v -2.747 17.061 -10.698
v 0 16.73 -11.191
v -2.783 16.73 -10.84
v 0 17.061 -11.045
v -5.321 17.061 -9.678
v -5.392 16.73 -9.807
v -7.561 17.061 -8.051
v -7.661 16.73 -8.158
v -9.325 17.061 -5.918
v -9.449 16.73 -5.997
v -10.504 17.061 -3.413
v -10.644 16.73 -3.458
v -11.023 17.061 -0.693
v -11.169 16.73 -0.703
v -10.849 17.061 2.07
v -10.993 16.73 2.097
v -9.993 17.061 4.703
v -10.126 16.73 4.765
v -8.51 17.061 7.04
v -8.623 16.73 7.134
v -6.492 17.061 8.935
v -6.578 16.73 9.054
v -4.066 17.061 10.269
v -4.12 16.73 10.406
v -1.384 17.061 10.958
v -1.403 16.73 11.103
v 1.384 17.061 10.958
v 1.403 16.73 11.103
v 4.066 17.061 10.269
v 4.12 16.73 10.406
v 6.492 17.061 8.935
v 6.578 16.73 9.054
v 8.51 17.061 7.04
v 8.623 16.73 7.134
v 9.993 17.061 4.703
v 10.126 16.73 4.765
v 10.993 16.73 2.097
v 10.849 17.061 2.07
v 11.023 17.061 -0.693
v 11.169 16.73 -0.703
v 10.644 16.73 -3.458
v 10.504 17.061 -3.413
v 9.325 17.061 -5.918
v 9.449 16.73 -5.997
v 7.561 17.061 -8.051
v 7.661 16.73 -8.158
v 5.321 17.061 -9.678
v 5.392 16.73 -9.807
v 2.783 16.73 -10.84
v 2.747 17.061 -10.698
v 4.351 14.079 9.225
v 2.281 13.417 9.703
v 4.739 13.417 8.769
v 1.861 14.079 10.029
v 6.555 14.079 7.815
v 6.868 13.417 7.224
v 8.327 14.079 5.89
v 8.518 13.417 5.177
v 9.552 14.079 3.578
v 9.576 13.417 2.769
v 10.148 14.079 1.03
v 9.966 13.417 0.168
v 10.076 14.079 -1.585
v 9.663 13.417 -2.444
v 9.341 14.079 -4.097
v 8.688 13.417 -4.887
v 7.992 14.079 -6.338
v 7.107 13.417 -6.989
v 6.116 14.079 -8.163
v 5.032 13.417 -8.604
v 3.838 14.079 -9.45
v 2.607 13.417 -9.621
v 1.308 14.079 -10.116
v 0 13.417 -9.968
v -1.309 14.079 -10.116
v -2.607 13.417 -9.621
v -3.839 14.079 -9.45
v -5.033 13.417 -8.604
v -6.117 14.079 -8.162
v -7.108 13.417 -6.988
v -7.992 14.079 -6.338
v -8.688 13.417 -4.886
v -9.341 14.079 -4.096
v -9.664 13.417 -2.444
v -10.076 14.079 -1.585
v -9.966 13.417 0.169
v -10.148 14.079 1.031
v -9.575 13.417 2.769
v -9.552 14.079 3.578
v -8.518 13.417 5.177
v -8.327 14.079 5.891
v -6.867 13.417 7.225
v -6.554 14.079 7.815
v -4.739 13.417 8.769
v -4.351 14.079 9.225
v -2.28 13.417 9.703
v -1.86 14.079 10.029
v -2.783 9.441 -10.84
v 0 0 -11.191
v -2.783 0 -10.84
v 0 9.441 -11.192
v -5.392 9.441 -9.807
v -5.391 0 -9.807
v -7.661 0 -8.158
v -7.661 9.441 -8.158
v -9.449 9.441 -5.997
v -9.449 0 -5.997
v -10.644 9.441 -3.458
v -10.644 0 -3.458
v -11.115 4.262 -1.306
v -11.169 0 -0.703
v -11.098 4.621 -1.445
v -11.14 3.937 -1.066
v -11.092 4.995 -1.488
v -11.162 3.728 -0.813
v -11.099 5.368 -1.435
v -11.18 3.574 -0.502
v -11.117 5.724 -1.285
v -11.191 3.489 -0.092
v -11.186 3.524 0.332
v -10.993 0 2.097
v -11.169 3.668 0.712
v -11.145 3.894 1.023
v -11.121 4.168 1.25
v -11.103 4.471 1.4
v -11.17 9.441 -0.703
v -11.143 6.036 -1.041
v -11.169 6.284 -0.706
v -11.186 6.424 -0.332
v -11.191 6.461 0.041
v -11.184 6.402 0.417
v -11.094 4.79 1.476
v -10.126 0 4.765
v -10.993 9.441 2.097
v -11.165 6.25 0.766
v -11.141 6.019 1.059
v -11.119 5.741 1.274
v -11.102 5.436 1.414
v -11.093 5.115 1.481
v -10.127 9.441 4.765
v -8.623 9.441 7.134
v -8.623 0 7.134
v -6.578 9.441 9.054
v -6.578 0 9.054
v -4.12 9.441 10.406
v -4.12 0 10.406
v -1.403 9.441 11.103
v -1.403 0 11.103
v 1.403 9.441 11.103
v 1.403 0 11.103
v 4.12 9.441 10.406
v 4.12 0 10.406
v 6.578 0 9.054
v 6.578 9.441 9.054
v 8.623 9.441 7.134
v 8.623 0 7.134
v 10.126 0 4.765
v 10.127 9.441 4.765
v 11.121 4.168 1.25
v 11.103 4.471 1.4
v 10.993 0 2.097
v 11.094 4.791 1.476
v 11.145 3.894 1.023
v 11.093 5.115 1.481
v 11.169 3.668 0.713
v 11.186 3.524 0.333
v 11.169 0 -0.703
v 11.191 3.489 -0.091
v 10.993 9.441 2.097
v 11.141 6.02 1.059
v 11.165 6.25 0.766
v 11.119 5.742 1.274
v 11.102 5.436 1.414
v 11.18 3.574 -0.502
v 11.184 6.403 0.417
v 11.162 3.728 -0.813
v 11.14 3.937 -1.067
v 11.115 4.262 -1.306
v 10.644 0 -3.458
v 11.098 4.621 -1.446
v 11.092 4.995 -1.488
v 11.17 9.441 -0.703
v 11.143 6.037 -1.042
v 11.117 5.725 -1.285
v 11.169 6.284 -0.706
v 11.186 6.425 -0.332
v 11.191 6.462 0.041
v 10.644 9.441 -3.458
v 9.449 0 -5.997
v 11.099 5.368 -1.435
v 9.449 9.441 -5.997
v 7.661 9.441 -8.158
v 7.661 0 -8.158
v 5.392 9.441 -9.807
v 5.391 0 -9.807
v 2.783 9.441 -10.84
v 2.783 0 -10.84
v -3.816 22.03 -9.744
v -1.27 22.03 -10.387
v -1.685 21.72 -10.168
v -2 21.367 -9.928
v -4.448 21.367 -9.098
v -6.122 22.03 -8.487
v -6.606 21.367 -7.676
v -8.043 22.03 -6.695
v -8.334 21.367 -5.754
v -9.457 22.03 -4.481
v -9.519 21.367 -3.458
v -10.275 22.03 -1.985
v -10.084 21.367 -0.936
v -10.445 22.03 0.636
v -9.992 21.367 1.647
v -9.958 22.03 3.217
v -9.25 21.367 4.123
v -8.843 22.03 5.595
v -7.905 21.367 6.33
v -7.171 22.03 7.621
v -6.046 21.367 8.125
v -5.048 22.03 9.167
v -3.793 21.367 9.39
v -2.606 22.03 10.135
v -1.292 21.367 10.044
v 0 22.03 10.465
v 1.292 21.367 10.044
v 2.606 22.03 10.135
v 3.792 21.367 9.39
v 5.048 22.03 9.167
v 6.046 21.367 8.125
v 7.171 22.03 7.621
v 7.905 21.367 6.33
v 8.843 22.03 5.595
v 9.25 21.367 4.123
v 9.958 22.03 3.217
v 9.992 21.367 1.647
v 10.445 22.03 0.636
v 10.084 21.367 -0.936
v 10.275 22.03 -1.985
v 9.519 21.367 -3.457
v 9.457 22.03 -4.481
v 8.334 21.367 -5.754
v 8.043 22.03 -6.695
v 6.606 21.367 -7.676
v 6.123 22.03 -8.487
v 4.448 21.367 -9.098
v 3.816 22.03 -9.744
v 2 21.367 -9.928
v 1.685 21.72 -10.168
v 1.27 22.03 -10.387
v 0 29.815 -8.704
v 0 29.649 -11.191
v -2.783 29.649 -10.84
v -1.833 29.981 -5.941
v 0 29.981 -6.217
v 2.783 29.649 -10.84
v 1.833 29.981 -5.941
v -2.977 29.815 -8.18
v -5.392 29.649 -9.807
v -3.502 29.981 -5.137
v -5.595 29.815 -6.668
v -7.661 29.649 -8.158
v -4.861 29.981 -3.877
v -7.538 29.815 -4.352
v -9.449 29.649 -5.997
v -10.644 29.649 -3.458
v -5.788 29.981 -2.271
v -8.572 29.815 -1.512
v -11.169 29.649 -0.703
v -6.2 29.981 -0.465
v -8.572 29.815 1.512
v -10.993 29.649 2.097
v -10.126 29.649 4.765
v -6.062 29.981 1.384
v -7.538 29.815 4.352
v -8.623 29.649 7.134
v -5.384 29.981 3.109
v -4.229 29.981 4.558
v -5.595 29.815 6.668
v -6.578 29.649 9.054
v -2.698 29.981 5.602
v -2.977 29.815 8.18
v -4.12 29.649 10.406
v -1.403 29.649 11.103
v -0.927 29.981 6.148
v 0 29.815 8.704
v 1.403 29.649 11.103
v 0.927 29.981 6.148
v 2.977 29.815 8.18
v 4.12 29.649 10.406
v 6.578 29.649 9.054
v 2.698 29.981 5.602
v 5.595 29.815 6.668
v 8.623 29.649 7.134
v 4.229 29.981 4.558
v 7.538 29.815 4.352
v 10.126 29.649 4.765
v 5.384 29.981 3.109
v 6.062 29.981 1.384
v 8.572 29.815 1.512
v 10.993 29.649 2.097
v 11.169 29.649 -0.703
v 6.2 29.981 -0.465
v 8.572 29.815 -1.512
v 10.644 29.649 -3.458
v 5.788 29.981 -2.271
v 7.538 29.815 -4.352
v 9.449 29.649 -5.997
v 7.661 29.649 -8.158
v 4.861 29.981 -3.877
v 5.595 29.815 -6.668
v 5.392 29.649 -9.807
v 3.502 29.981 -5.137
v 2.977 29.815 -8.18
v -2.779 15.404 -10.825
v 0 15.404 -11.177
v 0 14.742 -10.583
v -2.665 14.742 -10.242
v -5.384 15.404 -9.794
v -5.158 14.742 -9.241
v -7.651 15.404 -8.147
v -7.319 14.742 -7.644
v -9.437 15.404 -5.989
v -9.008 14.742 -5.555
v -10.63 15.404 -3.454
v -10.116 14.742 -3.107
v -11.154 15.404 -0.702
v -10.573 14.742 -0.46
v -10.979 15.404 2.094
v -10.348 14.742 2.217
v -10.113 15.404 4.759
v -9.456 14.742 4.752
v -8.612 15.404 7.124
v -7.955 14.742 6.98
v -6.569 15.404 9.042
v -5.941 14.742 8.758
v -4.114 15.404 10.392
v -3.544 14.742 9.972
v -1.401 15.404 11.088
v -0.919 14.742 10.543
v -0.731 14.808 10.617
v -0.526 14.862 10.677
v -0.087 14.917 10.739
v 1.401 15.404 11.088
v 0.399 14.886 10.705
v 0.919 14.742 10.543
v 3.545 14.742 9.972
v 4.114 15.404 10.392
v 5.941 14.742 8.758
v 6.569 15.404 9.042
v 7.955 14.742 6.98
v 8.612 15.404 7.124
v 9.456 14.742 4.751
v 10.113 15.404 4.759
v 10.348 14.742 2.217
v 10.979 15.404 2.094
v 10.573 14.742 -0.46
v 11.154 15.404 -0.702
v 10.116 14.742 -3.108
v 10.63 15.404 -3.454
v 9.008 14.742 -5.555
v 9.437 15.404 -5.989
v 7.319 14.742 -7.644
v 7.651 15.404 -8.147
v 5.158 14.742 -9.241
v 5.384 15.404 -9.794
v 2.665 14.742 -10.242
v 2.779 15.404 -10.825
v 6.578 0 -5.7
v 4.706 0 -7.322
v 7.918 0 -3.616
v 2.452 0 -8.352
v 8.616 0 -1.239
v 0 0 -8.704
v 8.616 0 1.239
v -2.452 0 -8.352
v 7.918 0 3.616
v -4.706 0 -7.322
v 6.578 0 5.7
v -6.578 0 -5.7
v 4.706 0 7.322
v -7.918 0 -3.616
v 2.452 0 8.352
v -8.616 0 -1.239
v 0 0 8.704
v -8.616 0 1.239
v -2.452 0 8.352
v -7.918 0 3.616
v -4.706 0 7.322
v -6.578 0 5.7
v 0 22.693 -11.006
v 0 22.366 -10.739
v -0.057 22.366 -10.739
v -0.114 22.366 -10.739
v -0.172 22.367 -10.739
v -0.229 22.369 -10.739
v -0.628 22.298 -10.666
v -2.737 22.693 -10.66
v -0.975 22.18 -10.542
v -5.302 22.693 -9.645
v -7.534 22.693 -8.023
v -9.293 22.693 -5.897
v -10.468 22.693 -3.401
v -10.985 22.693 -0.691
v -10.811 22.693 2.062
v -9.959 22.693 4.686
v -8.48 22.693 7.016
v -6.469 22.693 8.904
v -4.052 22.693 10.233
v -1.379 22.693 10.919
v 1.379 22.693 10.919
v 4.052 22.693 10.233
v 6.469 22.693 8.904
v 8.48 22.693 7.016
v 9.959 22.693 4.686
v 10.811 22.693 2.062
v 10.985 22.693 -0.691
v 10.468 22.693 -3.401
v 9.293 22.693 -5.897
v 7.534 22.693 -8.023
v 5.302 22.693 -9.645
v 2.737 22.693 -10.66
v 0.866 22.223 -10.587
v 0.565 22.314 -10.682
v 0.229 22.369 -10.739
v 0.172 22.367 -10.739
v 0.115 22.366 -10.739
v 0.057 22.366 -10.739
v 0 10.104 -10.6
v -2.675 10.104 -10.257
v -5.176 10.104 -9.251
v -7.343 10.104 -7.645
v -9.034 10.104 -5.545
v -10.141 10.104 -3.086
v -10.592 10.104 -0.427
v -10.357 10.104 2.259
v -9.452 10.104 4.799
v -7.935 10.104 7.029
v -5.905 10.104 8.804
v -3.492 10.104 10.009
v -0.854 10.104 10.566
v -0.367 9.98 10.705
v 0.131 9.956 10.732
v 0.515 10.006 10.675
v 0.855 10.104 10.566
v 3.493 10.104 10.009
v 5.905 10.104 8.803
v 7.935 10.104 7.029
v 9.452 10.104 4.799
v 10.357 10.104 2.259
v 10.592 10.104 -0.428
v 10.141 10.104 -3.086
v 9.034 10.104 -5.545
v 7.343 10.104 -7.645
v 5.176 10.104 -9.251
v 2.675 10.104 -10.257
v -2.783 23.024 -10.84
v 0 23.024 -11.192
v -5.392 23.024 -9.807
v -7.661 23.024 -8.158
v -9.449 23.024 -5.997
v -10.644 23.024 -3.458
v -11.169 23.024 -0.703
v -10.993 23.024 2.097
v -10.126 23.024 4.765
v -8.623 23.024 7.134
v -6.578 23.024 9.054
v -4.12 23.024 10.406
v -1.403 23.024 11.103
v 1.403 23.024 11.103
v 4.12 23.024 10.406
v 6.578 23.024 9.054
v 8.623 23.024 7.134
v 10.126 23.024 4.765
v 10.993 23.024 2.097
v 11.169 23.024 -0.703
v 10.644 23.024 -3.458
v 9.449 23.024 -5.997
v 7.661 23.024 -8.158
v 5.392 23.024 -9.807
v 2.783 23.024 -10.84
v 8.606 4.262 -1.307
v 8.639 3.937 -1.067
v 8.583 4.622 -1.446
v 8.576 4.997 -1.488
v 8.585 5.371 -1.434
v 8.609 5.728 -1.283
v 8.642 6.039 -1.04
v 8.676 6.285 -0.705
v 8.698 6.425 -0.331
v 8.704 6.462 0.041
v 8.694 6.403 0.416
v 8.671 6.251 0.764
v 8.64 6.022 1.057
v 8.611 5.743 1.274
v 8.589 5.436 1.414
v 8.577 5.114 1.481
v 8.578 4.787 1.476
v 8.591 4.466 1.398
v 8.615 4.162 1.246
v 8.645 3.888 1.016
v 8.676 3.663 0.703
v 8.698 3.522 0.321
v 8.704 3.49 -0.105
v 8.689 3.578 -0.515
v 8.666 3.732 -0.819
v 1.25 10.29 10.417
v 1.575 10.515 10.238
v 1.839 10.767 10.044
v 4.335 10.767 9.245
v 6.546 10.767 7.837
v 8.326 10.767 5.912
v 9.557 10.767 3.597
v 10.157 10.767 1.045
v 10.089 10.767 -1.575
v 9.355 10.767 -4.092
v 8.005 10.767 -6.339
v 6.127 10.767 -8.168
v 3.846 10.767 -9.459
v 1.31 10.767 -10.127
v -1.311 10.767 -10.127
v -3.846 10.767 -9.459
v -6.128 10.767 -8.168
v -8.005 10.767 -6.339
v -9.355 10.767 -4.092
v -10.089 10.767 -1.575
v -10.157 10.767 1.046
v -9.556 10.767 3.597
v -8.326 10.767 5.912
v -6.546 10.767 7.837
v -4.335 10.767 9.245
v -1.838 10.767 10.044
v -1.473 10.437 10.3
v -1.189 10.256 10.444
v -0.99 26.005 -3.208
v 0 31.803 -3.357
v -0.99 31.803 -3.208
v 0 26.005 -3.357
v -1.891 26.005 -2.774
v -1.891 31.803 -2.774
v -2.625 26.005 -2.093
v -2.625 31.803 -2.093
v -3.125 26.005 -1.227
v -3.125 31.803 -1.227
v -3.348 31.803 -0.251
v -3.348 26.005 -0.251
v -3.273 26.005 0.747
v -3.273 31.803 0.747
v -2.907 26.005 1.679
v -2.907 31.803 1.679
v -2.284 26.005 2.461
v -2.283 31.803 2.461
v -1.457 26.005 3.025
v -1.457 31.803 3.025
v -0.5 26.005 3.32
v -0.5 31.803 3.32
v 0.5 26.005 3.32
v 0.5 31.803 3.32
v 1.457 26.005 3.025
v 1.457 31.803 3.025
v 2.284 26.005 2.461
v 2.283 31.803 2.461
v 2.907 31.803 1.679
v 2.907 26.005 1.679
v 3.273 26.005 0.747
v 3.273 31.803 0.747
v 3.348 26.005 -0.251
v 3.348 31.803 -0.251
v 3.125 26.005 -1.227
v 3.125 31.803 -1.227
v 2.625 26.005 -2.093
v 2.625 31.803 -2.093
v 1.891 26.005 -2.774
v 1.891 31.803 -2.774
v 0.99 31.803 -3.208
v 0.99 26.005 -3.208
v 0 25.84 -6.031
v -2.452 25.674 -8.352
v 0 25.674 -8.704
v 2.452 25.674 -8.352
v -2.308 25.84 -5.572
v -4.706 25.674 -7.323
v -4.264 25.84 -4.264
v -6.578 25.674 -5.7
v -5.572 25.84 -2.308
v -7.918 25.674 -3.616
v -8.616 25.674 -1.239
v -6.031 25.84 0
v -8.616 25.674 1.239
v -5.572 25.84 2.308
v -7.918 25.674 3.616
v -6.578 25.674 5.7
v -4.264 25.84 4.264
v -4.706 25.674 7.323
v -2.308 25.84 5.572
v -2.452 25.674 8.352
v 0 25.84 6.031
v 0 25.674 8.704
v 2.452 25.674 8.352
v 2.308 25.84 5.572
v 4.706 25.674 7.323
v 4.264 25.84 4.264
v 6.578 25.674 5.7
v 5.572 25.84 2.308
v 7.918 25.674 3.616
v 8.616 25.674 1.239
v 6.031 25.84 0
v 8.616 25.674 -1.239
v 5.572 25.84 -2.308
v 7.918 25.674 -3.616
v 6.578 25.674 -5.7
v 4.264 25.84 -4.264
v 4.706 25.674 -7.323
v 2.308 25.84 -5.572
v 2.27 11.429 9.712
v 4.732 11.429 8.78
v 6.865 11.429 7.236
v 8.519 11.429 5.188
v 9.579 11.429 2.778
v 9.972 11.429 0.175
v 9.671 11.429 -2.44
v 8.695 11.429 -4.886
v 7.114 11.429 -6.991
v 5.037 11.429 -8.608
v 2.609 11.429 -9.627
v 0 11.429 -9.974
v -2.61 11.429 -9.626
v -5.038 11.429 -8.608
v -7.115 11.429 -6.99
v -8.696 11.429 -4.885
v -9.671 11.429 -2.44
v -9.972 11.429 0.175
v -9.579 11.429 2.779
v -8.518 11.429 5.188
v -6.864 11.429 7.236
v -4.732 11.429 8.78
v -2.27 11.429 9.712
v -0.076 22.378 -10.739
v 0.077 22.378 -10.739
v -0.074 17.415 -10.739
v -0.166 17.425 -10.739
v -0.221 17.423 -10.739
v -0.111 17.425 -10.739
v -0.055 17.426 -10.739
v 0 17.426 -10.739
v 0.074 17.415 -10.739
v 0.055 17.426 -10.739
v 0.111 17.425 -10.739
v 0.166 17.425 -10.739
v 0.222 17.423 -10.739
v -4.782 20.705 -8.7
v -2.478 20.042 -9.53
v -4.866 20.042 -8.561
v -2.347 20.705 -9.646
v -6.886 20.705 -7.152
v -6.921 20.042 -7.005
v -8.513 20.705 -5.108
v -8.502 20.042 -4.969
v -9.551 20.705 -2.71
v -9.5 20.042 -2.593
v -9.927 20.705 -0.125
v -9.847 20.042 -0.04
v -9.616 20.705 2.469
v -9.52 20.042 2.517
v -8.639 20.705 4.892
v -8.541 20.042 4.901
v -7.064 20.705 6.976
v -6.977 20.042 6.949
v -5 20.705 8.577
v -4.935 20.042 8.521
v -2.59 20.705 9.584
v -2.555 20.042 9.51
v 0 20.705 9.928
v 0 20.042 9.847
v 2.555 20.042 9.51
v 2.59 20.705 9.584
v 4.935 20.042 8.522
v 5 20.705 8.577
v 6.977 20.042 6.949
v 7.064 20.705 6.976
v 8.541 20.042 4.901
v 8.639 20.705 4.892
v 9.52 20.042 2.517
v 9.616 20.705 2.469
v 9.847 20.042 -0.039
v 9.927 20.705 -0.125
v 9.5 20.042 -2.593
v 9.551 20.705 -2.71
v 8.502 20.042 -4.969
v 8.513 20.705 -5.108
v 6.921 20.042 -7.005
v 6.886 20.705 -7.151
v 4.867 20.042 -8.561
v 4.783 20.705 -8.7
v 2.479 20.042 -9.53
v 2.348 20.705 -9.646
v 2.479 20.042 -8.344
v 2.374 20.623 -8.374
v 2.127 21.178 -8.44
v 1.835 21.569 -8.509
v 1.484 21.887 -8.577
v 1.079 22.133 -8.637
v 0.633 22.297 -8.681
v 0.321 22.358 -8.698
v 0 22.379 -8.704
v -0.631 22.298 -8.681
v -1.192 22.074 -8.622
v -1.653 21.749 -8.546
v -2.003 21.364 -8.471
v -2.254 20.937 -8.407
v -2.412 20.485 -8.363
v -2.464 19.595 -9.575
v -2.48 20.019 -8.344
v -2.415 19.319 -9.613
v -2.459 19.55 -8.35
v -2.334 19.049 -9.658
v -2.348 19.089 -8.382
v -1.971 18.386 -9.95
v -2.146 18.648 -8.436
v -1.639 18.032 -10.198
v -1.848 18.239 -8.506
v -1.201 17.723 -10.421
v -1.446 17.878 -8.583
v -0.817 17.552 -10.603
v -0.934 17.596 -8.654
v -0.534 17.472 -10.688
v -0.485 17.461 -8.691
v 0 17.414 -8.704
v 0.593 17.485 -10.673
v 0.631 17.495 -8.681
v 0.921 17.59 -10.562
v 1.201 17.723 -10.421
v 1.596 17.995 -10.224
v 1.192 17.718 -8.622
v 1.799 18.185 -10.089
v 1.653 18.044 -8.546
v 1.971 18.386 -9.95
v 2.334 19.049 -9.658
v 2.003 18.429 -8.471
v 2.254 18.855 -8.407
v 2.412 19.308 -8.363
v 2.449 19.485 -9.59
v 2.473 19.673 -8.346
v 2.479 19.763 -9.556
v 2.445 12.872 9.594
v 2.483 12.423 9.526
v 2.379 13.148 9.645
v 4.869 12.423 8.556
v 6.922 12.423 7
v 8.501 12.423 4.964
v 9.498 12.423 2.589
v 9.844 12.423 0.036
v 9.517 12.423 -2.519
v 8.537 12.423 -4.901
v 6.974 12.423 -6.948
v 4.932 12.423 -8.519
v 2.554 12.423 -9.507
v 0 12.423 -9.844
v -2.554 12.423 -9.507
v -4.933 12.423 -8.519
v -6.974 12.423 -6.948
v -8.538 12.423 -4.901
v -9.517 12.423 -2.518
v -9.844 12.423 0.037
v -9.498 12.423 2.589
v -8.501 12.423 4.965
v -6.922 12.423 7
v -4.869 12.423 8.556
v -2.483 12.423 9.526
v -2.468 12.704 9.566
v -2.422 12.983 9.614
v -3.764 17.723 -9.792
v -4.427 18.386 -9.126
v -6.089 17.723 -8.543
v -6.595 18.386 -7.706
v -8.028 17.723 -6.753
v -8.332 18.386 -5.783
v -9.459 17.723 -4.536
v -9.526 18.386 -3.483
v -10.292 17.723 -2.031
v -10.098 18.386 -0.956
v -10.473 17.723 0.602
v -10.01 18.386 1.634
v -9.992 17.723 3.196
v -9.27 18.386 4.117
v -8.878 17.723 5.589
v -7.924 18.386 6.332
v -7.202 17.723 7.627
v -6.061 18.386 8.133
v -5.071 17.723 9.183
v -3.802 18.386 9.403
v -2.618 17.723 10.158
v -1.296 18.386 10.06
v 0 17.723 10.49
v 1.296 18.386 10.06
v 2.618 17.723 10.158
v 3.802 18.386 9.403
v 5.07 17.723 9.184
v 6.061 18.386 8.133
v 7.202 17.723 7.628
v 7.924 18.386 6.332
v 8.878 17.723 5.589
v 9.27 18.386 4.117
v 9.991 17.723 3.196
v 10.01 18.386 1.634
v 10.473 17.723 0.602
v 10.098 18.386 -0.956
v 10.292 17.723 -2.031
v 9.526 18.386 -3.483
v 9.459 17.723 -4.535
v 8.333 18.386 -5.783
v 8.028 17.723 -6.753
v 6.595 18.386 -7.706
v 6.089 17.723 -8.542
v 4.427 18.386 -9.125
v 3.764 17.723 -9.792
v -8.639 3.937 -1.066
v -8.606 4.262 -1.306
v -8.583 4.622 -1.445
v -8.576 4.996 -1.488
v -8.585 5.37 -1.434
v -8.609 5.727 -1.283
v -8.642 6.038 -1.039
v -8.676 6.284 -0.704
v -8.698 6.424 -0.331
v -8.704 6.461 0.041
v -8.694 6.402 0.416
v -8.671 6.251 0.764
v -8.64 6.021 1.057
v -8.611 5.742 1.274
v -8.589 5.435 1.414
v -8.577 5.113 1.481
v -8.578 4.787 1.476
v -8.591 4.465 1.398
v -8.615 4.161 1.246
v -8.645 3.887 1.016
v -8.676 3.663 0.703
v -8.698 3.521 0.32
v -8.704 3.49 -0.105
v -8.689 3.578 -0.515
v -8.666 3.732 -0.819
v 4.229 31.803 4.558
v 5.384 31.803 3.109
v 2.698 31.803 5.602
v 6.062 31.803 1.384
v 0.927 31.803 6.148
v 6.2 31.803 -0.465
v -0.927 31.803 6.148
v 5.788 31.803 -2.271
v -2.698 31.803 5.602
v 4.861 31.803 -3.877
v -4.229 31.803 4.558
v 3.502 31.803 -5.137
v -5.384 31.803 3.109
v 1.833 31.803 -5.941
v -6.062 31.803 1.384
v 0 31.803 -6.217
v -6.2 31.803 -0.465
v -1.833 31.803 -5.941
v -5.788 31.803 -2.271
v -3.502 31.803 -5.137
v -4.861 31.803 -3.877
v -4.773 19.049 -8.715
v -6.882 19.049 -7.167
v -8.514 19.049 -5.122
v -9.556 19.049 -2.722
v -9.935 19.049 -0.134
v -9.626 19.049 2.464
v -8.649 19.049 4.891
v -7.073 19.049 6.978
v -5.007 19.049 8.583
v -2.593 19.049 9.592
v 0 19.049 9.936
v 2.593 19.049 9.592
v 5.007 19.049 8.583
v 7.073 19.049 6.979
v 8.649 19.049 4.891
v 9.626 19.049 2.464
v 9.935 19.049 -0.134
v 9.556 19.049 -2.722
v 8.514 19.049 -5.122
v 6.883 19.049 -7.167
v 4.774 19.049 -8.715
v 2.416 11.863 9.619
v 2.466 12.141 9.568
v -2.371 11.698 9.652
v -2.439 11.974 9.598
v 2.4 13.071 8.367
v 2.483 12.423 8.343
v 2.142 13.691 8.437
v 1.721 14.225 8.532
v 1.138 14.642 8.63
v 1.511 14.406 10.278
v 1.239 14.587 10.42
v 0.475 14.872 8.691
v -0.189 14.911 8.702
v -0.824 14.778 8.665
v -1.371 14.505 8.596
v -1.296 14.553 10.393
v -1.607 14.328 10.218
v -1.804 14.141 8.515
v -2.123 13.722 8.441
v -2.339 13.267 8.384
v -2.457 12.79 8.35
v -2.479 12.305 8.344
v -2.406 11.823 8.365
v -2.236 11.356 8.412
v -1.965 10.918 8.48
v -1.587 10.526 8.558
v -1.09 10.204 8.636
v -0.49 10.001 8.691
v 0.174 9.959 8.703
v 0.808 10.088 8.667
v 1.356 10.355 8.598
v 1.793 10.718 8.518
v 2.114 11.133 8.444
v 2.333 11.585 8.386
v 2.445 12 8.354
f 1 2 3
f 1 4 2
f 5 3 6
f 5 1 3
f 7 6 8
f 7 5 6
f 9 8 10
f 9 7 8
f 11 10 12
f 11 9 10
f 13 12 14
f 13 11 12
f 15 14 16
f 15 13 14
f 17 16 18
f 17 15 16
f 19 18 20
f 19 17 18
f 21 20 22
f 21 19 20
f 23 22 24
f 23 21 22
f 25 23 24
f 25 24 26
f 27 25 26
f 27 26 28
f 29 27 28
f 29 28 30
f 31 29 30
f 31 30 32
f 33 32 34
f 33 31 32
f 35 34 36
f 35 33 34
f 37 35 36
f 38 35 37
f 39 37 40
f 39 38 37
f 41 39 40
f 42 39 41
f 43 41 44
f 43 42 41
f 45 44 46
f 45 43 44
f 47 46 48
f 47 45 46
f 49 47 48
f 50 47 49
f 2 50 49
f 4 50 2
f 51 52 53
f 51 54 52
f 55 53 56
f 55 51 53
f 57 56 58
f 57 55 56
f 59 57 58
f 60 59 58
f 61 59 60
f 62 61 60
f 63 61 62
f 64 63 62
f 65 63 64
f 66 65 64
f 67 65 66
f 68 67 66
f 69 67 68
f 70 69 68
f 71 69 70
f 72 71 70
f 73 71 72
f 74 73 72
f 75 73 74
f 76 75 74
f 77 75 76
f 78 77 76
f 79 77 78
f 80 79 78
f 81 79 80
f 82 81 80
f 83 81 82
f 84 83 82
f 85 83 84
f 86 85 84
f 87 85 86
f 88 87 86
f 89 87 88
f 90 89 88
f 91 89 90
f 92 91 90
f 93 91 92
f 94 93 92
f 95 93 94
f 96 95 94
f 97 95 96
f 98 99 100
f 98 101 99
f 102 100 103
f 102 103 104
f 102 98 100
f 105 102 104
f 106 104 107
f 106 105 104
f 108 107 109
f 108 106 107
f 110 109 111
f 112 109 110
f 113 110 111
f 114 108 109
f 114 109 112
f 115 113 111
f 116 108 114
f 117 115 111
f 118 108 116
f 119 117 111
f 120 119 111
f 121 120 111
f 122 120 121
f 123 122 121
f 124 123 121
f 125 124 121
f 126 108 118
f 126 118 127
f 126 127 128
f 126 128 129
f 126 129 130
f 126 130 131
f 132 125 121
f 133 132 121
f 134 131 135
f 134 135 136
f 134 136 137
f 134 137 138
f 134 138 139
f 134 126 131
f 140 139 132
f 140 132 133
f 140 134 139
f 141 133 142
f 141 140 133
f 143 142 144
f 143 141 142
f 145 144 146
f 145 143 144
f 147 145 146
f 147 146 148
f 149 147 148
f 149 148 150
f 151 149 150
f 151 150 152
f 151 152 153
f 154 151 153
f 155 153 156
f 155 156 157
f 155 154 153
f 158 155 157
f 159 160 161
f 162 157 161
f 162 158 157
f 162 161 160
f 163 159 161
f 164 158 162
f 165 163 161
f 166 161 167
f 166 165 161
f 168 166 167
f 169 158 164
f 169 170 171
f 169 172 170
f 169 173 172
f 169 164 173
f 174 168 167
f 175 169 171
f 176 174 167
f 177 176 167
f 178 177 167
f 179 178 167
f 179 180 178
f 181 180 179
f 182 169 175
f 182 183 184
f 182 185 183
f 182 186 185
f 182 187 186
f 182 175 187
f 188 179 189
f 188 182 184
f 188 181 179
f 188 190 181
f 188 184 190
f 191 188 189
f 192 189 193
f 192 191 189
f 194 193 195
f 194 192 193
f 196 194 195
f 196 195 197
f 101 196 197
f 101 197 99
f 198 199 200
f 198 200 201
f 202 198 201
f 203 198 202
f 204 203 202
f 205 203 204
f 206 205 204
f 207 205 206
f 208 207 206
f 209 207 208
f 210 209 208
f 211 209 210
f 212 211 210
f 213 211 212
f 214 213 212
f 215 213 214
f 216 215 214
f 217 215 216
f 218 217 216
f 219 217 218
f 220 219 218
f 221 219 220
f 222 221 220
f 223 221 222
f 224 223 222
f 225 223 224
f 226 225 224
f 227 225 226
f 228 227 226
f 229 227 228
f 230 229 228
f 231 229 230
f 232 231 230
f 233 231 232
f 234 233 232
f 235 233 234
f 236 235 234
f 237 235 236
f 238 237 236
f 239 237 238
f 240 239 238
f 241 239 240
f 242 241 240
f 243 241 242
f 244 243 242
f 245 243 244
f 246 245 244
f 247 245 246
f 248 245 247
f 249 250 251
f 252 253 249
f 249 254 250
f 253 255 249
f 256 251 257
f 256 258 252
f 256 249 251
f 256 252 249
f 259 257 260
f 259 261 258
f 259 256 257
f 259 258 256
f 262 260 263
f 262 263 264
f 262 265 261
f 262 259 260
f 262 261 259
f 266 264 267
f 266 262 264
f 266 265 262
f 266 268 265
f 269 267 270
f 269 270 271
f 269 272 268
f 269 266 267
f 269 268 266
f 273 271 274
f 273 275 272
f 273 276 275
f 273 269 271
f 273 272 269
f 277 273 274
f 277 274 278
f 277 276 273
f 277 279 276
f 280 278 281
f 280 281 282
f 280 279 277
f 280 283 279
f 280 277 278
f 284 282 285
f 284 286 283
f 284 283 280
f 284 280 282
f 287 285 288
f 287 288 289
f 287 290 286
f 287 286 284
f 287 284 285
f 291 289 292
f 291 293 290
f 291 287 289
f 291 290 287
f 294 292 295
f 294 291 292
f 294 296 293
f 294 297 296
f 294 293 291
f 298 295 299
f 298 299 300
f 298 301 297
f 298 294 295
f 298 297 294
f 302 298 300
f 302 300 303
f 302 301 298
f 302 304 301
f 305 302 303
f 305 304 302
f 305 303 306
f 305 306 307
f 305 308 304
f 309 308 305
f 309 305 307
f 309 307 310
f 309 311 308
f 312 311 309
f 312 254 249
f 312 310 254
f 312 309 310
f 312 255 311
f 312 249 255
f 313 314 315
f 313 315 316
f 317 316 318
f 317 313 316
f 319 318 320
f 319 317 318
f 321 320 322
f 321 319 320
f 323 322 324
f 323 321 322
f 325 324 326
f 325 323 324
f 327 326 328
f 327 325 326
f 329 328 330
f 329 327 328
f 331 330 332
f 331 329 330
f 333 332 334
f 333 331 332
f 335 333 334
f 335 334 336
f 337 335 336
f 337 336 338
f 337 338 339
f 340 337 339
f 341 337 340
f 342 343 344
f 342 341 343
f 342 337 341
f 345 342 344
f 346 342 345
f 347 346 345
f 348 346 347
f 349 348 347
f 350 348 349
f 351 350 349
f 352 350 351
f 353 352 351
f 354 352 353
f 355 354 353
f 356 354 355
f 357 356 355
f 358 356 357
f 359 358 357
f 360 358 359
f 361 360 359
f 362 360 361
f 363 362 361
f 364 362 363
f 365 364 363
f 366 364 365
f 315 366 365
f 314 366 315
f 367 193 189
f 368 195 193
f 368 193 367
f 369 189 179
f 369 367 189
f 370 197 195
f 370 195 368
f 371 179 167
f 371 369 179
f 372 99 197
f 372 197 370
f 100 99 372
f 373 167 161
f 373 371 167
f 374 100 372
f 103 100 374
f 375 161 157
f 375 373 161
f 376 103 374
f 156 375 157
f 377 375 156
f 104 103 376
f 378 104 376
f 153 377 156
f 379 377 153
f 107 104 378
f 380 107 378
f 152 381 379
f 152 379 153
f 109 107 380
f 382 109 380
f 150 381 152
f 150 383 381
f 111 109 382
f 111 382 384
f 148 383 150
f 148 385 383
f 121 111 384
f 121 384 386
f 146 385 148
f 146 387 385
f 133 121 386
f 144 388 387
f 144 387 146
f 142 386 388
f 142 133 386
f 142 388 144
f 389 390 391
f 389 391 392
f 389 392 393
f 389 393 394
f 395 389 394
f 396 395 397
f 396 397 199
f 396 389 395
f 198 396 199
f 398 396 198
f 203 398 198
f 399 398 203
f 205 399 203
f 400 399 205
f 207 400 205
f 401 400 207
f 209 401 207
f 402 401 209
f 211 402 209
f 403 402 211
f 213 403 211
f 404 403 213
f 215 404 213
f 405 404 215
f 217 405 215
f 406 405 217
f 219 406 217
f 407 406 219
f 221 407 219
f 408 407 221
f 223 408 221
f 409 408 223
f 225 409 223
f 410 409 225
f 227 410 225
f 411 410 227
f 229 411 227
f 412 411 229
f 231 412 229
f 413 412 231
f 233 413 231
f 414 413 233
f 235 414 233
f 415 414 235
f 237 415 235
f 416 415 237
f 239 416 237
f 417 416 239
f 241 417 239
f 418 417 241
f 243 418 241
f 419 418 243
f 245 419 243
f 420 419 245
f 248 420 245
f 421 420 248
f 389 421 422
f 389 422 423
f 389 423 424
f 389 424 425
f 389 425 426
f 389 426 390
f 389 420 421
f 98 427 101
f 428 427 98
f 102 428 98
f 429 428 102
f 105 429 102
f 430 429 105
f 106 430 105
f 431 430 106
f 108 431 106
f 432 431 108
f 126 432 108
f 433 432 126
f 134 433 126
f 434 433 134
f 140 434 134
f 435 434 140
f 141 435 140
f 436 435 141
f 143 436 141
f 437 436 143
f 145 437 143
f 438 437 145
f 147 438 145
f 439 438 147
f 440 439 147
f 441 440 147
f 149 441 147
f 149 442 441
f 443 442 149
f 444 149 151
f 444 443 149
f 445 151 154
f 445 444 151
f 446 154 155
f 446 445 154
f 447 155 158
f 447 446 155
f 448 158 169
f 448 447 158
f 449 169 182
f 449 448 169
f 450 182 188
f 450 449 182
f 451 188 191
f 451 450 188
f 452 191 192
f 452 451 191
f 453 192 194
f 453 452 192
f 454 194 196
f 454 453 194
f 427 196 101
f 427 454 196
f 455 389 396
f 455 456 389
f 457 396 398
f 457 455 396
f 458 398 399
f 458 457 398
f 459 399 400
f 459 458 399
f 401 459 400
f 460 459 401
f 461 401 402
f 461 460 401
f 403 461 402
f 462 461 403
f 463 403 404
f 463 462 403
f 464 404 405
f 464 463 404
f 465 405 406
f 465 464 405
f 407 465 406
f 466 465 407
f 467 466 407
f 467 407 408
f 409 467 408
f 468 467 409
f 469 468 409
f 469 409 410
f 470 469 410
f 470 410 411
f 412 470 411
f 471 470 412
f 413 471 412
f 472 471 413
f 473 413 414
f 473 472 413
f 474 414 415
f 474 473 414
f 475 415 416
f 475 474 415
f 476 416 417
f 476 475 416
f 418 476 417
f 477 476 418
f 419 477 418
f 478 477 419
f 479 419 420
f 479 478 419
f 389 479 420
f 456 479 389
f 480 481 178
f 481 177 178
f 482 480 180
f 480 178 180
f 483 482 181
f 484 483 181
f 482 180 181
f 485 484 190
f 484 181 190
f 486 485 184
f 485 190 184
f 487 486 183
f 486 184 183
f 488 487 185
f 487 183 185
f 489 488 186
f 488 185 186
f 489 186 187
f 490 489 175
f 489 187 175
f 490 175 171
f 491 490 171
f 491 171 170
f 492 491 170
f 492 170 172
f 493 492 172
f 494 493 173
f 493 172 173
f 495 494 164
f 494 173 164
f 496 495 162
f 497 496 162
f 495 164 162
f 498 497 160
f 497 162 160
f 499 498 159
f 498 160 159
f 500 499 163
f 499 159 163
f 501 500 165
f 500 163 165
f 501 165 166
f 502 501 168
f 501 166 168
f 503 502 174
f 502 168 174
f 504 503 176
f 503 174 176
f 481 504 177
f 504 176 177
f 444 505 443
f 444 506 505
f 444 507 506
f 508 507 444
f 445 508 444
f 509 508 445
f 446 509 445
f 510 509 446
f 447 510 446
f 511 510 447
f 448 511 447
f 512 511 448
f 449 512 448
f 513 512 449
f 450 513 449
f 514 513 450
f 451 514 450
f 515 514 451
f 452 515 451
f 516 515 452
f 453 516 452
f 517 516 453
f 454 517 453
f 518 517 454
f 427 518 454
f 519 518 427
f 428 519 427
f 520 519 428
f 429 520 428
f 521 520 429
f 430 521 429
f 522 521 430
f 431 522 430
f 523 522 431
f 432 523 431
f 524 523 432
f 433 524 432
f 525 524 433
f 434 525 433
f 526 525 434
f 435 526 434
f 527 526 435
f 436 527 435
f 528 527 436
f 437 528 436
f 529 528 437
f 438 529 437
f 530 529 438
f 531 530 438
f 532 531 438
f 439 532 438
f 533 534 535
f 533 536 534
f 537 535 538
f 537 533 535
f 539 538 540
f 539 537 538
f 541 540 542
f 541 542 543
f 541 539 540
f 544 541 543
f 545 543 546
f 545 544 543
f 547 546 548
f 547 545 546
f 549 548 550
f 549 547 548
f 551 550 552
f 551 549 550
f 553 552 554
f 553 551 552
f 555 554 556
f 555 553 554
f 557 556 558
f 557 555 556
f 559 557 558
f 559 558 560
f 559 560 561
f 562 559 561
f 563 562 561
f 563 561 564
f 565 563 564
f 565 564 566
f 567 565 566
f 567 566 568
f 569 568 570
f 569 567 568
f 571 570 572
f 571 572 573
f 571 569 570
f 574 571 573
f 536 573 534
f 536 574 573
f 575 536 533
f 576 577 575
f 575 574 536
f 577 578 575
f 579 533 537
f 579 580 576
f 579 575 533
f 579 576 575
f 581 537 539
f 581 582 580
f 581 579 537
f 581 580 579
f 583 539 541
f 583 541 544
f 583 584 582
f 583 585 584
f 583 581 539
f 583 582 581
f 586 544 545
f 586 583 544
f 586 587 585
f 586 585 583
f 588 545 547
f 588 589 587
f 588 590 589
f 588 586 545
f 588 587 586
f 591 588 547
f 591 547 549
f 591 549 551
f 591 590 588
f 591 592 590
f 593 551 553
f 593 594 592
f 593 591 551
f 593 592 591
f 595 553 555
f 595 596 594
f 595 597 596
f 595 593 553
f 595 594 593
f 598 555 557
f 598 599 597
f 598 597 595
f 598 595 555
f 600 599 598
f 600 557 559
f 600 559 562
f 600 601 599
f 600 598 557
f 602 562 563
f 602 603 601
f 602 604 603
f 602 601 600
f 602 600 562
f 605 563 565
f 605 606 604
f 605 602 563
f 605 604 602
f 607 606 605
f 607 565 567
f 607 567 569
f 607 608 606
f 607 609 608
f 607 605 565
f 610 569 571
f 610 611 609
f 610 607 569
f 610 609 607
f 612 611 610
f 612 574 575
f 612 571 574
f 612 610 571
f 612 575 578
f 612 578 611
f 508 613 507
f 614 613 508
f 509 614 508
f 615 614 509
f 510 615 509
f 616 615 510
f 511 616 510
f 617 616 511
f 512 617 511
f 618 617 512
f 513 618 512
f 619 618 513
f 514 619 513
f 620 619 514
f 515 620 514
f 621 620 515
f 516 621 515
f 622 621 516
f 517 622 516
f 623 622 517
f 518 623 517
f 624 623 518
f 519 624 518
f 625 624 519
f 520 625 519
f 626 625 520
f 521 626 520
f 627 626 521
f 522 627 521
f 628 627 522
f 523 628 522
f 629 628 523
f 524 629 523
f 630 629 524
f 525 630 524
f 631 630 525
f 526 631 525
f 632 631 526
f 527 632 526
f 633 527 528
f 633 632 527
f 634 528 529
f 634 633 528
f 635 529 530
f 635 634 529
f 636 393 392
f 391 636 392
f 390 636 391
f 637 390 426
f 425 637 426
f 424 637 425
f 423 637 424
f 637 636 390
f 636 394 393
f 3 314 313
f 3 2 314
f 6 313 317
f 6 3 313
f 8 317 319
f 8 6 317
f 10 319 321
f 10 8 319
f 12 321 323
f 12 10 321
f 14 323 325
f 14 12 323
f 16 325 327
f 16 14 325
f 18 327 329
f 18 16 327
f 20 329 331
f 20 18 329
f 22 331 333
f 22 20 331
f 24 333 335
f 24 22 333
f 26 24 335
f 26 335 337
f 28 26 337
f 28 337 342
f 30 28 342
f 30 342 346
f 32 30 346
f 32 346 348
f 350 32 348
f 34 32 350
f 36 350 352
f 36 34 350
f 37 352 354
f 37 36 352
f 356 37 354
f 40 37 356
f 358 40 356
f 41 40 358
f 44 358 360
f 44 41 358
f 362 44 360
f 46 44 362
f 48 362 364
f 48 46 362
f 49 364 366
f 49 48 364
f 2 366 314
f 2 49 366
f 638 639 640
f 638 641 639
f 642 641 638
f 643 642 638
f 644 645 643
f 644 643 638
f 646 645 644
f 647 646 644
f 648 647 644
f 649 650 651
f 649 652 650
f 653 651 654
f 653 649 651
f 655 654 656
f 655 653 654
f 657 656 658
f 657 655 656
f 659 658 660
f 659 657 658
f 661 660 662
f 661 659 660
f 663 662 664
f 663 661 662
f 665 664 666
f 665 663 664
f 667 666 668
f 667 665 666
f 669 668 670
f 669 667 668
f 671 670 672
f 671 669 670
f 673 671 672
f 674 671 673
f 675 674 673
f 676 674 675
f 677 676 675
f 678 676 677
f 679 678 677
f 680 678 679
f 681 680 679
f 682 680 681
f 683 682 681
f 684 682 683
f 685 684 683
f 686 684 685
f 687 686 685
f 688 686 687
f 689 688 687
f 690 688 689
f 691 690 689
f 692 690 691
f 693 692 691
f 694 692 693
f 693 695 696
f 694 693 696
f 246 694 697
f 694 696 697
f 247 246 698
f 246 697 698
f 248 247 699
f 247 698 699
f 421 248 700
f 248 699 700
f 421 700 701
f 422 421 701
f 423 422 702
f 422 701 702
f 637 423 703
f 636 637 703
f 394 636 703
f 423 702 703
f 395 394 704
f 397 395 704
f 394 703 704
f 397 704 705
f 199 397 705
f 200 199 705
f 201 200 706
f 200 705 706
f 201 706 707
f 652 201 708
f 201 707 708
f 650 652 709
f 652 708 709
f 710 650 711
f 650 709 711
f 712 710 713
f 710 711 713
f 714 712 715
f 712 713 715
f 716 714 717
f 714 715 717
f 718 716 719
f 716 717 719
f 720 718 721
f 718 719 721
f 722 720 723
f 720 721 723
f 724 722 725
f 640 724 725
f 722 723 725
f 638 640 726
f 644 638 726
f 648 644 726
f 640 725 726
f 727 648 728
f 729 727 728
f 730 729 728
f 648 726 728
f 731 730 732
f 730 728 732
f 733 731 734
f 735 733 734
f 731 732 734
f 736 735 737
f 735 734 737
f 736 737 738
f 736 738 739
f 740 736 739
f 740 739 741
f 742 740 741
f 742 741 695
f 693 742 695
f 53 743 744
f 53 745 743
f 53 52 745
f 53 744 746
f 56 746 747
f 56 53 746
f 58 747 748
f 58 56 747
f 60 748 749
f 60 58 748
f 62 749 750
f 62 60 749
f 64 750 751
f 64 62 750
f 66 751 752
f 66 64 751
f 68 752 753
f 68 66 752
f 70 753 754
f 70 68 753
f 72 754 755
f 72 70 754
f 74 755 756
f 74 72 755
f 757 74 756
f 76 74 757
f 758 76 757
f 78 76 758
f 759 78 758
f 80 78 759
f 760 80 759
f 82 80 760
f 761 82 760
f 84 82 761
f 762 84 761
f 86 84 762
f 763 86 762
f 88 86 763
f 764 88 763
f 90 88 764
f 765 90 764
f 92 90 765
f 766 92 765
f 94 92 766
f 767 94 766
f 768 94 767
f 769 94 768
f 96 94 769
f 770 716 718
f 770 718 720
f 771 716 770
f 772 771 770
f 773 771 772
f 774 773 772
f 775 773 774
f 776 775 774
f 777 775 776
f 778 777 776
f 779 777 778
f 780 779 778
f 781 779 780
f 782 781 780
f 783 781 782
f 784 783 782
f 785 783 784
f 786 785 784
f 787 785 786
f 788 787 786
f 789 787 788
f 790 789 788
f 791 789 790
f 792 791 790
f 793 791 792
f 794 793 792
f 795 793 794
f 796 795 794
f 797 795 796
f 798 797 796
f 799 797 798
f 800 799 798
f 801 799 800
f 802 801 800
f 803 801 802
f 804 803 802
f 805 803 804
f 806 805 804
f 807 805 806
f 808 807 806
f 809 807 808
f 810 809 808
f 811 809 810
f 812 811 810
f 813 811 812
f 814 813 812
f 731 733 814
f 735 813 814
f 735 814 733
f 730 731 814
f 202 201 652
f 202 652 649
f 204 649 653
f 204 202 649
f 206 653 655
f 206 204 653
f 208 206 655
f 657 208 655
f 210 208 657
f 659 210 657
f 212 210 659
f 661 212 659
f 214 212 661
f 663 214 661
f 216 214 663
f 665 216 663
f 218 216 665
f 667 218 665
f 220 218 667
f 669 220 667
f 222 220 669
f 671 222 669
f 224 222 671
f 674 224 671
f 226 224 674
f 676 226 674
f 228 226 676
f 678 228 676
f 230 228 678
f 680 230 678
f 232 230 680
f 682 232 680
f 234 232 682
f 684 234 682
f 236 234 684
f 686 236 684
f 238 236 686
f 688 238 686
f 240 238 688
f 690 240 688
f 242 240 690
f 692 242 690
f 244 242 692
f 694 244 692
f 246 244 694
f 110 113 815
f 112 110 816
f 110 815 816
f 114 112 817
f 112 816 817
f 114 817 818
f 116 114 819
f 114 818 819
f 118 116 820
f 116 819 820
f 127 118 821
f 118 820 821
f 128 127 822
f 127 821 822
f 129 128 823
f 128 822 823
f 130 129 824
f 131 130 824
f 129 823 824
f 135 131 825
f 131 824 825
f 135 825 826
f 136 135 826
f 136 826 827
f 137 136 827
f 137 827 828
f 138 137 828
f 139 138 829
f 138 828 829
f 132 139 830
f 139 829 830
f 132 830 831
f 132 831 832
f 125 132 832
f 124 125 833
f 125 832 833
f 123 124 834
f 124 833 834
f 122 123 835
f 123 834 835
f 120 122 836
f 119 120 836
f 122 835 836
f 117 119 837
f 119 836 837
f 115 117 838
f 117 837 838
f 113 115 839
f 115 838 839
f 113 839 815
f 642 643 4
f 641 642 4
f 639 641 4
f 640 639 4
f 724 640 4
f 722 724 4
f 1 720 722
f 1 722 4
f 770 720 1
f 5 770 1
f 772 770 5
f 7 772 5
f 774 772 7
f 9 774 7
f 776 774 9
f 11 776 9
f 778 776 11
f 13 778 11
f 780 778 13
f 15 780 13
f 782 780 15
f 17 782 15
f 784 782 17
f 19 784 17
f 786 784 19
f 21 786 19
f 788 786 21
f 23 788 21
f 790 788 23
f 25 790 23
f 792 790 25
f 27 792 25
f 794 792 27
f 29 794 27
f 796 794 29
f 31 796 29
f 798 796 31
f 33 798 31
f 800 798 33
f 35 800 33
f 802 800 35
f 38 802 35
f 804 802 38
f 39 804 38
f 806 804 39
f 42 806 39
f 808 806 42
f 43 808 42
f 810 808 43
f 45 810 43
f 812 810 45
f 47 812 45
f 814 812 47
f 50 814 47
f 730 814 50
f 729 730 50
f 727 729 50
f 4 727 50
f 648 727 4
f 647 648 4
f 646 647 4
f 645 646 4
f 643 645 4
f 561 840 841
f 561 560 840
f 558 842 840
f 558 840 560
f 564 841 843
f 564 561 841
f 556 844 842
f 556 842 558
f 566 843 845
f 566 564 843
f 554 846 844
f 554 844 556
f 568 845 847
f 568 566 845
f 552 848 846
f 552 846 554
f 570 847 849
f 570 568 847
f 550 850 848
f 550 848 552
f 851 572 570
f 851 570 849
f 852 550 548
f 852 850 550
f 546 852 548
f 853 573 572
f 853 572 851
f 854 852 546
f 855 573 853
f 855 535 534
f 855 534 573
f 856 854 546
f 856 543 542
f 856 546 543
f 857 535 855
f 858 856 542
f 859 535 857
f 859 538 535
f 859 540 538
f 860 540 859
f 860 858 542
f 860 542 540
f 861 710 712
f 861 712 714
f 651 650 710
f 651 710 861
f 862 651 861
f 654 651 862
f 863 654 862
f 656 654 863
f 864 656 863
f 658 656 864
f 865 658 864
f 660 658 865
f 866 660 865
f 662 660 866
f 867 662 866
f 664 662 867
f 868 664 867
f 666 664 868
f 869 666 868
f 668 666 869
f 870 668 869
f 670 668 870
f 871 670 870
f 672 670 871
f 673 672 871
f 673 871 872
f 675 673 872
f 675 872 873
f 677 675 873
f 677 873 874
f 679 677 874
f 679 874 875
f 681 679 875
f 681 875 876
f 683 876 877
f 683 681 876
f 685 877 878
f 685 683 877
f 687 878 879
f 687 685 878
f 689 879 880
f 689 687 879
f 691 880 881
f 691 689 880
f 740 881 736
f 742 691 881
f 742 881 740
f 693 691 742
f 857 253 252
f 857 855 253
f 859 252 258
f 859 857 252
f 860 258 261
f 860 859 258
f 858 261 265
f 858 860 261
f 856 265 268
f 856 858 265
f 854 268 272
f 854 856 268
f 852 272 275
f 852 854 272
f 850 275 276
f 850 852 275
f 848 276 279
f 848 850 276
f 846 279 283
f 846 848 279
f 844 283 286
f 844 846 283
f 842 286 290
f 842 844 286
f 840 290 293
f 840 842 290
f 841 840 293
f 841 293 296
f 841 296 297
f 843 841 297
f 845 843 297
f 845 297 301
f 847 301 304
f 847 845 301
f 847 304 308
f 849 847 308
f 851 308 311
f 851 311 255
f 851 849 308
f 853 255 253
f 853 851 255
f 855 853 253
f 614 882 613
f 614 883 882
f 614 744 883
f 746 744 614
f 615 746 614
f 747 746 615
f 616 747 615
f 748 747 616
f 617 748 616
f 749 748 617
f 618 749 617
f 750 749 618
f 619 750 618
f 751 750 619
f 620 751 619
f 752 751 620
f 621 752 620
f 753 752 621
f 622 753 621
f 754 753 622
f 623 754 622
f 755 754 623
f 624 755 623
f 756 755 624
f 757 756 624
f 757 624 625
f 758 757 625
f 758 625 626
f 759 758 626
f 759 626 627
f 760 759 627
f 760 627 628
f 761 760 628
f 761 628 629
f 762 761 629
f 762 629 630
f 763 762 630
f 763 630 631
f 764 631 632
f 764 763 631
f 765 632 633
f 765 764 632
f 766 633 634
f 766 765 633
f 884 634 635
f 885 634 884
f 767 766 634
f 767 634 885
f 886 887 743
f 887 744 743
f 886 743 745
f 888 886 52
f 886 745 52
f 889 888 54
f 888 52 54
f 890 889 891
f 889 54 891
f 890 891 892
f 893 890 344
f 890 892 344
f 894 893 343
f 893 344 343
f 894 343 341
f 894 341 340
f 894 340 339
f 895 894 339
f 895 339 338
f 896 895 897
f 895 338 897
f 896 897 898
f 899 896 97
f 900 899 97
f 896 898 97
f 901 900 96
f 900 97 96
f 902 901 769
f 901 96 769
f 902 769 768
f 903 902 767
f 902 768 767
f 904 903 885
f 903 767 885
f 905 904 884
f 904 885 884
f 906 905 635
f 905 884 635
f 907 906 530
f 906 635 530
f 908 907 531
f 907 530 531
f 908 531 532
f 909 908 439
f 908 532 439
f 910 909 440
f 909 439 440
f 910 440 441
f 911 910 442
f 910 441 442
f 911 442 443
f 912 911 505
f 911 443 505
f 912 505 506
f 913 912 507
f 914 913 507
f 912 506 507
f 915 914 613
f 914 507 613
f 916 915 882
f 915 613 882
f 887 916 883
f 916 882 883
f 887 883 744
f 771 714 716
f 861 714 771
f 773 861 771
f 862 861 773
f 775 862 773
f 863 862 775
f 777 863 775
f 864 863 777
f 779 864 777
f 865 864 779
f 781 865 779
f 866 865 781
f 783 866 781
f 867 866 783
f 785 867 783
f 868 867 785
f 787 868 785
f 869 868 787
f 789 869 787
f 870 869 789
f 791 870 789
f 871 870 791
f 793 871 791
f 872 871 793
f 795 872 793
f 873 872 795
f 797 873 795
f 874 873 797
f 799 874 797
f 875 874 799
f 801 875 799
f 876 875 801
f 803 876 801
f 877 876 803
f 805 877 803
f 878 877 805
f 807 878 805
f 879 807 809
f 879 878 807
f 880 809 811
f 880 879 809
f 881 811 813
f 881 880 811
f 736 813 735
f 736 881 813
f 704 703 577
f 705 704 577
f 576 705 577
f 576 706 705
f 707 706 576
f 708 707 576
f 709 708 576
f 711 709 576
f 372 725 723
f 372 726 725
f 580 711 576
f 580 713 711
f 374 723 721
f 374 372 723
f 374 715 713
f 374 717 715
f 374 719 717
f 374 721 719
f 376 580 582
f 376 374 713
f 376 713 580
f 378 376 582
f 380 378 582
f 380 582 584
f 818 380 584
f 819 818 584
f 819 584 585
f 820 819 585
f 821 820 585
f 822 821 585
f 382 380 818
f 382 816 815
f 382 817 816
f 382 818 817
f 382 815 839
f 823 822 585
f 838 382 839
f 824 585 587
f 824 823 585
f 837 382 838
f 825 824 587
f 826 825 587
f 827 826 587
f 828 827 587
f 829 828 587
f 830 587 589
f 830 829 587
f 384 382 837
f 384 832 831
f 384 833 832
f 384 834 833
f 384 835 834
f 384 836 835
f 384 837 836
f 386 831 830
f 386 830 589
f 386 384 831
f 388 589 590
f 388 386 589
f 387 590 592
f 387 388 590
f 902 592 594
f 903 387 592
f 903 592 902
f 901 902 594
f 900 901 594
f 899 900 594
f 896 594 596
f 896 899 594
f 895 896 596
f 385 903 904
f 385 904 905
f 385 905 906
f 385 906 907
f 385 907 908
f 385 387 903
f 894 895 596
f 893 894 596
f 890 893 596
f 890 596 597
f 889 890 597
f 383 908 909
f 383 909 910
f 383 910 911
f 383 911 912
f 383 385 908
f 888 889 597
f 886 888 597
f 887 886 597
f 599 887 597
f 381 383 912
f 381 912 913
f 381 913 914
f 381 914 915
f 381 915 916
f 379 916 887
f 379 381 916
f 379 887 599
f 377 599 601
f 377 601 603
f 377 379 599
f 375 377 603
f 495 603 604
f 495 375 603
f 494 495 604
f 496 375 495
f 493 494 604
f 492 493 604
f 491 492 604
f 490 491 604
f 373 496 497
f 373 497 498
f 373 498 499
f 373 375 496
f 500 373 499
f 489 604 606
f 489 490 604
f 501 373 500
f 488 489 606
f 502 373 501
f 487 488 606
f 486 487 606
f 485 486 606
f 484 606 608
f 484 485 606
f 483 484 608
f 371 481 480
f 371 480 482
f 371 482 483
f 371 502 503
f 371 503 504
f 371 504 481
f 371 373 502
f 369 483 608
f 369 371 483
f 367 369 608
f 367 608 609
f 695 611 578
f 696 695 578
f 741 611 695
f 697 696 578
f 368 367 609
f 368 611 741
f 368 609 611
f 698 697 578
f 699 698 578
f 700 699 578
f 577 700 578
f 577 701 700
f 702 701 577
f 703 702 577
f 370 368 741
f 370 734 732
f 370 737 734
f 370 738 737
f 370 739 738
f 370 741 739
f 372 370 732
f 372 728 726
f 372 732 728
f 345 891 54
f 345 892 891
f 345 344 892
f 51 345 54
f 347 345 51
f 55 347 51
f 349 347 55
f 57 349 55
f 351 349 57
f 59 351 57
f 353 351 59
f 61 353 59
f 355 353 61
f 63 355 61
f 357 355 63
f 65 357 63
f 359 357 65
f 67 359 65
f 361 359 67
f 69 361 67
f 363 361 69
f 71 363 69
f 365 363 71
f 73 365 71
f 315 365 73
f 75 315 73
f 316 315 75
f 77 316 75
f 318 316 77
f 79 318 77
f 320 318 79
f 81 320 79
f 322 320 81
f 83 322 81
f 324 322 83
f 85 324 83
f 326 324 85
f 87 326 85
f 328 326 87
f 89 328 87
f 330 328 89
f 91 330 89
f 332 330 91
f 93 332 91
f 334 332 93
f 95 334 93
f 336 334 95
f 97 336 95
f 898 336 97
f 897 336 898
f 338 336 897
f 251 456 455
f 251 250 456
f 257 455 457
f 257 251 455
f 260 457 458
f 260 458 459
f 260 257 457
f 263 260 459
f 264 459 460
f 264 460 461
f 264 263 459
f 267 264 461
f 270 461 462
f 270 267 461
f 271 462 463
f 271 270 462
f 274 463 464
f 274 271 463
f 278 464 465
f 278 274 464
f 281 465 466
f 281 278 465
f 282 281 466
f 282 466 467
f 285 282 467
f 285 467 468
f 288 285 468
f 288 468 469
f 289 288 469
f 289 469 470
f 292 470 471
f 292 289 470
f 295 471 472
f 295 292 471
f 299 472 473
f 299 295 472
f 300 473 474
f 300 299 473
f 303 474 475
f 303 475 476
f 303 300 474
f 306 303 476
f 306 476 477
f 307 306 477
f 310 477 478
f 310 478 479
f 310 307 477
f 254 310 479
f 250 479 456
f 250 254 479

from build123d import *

# Parameters (mm, degrees)
CADVIEW_START                   = -9.527864724
CADVIEW_RADIAL_HOLE_PROFILE_1_R = 2.48285337
CADVIEW_RADIAL_HOLE_1_DEPTH     = 1.211153441
CADVIEW_START_2                 = 9.883993552
CADVIEW_RADIAL_HOLE_PROFILE_3_R = 1.487902792
CADVIEW_RADIAL_HOLE_3_DEPTH     = 1.33410702
CADVIEW_START_3                 = 9.529411148
CADVIEW_RADIAL_HOLE_PROFILE_2_R = 2.482933282
CADVIEW_RADIAL_HOLE_2_DEPTH     = 1.211645438
CADVIEW_START_4                 = -9.883175541
CADVIEW_RADIAL_HOLE_PROFILE_4_R = 1.487684902
CADVIEW_RADIAL_HOLE_4_DEPTH     = 1.33397788


with BuildPart() as part:
    # CADView Revolve Profile → CADView Core Revolve (revolve)
    with BuildSketch(Plane.XY, mode=Mode.PRIVATE) as cadview_core_revolve_sk:
        Polygon((11.191399791, 0), (11.191653126, 9.441445801), (10.600473645, 10.104003401), (10.21110818, 10.766561001), (9.973962294, 11.429118601), (9.844267199, 12.422955001), (9.96776039, 13.416791401), (10.199820897, 14.079349001), (10.58298579, 14.741906601), (11.17653503, 15.404464201), (11.191453753, 16.729579401), (11.044622402, 17.060858201), (10.490300644, 17.723415801), (10.142815737, 18.385973401), (9.936295224, 19.048531001), (9.847392508, 20.042367401), (9.928006815, 20.704925001), (10.127236671, 21.367482602), (10.464744973, 22.030040202), (11.006241128, 22.692597802), (11.19151131, 23.023876602), (11.191468831, 29.649452602), (6.217451578, 29.980731402), (6.217426324, 31.802764802), (3.357168025, 31.802764802), (3.357285746, 26.005385802), (8.704312973, 25.674107002), (8.704166835, 0), align=None)
    revolve(cadview_core_revolve_sk.sketch.rotate(Axis((0, 0, 0), (0, 1, 0)), 90), axis=Axis((0, 0, 0), (0, 1, 0)))

    # CADView Radial Hole Profile 1 → CADView Radial Hole 1 (cut, symmetric)
    with BuildSketch(Plane.XY.offset(CADVIEW_START)):
        with Locations(Location((7.8903e-05, 19.896357505, 0), (0, 0, 3.371355006))):
            Circle(CADVIEW_RADIAL_HOLE_PROFILE_1_R)
    extrude(amount=CADVIEW_RADIAL_HOLE_1_DEPTH, both=True, mode=Mode.SUBTRACT)

    # CADView Radial Hole Profile 3 → CADView Radial Hole 3 (cut, symmetric)
    with BuildSketch(Plane(origin=(0, 0, 0), x_dir=(0, 0, -1), z_dir=(1, 0, 0)).offset(CADVIEW_START_2)):
        with Locations(Location((0.000122905, 4.974426113, 0), (0, 0, 315.785142597))):
            Circle(CADVIEW_RADIAL_HOLE_PROFILE_3_R)
    extrude(amount=CADVIEW_RADIAL_HOLE_3_DEPTH, both=True, mode=Mode.SUBTRACT)

    # CADView Radial Hole Profile 2 → CADView Radial Hole 2 (cut, symmetric)
    with BuildSketch(Plane.XY.offset(CADVIEW_START_3)):
        with Locations(Location((0.000277866, 12.43536503, 0), (0, 0, 359.713626975))):
            Circle(CADVIEW_RADIAL_HOLE_PROFILE_2_R)
    extrude(amount=CADVIEW_RADIAL_HOLE_2_DEPTH, both=True, mode=Mode.SUBTRACT)

    # CADView Radial Hole Profile 4 → CADView Radial Hole 4 (cut, symmetric)
    with BuildSketch(Plane(origin=(0, 0, 0), x_dir=(0, 0, -1), z_dir=(1, 0, 0)).offset(CADVIEW_START_4)):
        with Locations(Location((2.8248e-05, 4.974003332, 0), (0, 0, 315.785395623))):
            Circle(CADVIEW_RADIAL_HOLE_PROFILE_4_R)
    extrude(amount=CADVIEW_RADIAL_HOLE_4_DEPTH, both=True, mode=Mode.SUBTRACT)


solid = part.part
